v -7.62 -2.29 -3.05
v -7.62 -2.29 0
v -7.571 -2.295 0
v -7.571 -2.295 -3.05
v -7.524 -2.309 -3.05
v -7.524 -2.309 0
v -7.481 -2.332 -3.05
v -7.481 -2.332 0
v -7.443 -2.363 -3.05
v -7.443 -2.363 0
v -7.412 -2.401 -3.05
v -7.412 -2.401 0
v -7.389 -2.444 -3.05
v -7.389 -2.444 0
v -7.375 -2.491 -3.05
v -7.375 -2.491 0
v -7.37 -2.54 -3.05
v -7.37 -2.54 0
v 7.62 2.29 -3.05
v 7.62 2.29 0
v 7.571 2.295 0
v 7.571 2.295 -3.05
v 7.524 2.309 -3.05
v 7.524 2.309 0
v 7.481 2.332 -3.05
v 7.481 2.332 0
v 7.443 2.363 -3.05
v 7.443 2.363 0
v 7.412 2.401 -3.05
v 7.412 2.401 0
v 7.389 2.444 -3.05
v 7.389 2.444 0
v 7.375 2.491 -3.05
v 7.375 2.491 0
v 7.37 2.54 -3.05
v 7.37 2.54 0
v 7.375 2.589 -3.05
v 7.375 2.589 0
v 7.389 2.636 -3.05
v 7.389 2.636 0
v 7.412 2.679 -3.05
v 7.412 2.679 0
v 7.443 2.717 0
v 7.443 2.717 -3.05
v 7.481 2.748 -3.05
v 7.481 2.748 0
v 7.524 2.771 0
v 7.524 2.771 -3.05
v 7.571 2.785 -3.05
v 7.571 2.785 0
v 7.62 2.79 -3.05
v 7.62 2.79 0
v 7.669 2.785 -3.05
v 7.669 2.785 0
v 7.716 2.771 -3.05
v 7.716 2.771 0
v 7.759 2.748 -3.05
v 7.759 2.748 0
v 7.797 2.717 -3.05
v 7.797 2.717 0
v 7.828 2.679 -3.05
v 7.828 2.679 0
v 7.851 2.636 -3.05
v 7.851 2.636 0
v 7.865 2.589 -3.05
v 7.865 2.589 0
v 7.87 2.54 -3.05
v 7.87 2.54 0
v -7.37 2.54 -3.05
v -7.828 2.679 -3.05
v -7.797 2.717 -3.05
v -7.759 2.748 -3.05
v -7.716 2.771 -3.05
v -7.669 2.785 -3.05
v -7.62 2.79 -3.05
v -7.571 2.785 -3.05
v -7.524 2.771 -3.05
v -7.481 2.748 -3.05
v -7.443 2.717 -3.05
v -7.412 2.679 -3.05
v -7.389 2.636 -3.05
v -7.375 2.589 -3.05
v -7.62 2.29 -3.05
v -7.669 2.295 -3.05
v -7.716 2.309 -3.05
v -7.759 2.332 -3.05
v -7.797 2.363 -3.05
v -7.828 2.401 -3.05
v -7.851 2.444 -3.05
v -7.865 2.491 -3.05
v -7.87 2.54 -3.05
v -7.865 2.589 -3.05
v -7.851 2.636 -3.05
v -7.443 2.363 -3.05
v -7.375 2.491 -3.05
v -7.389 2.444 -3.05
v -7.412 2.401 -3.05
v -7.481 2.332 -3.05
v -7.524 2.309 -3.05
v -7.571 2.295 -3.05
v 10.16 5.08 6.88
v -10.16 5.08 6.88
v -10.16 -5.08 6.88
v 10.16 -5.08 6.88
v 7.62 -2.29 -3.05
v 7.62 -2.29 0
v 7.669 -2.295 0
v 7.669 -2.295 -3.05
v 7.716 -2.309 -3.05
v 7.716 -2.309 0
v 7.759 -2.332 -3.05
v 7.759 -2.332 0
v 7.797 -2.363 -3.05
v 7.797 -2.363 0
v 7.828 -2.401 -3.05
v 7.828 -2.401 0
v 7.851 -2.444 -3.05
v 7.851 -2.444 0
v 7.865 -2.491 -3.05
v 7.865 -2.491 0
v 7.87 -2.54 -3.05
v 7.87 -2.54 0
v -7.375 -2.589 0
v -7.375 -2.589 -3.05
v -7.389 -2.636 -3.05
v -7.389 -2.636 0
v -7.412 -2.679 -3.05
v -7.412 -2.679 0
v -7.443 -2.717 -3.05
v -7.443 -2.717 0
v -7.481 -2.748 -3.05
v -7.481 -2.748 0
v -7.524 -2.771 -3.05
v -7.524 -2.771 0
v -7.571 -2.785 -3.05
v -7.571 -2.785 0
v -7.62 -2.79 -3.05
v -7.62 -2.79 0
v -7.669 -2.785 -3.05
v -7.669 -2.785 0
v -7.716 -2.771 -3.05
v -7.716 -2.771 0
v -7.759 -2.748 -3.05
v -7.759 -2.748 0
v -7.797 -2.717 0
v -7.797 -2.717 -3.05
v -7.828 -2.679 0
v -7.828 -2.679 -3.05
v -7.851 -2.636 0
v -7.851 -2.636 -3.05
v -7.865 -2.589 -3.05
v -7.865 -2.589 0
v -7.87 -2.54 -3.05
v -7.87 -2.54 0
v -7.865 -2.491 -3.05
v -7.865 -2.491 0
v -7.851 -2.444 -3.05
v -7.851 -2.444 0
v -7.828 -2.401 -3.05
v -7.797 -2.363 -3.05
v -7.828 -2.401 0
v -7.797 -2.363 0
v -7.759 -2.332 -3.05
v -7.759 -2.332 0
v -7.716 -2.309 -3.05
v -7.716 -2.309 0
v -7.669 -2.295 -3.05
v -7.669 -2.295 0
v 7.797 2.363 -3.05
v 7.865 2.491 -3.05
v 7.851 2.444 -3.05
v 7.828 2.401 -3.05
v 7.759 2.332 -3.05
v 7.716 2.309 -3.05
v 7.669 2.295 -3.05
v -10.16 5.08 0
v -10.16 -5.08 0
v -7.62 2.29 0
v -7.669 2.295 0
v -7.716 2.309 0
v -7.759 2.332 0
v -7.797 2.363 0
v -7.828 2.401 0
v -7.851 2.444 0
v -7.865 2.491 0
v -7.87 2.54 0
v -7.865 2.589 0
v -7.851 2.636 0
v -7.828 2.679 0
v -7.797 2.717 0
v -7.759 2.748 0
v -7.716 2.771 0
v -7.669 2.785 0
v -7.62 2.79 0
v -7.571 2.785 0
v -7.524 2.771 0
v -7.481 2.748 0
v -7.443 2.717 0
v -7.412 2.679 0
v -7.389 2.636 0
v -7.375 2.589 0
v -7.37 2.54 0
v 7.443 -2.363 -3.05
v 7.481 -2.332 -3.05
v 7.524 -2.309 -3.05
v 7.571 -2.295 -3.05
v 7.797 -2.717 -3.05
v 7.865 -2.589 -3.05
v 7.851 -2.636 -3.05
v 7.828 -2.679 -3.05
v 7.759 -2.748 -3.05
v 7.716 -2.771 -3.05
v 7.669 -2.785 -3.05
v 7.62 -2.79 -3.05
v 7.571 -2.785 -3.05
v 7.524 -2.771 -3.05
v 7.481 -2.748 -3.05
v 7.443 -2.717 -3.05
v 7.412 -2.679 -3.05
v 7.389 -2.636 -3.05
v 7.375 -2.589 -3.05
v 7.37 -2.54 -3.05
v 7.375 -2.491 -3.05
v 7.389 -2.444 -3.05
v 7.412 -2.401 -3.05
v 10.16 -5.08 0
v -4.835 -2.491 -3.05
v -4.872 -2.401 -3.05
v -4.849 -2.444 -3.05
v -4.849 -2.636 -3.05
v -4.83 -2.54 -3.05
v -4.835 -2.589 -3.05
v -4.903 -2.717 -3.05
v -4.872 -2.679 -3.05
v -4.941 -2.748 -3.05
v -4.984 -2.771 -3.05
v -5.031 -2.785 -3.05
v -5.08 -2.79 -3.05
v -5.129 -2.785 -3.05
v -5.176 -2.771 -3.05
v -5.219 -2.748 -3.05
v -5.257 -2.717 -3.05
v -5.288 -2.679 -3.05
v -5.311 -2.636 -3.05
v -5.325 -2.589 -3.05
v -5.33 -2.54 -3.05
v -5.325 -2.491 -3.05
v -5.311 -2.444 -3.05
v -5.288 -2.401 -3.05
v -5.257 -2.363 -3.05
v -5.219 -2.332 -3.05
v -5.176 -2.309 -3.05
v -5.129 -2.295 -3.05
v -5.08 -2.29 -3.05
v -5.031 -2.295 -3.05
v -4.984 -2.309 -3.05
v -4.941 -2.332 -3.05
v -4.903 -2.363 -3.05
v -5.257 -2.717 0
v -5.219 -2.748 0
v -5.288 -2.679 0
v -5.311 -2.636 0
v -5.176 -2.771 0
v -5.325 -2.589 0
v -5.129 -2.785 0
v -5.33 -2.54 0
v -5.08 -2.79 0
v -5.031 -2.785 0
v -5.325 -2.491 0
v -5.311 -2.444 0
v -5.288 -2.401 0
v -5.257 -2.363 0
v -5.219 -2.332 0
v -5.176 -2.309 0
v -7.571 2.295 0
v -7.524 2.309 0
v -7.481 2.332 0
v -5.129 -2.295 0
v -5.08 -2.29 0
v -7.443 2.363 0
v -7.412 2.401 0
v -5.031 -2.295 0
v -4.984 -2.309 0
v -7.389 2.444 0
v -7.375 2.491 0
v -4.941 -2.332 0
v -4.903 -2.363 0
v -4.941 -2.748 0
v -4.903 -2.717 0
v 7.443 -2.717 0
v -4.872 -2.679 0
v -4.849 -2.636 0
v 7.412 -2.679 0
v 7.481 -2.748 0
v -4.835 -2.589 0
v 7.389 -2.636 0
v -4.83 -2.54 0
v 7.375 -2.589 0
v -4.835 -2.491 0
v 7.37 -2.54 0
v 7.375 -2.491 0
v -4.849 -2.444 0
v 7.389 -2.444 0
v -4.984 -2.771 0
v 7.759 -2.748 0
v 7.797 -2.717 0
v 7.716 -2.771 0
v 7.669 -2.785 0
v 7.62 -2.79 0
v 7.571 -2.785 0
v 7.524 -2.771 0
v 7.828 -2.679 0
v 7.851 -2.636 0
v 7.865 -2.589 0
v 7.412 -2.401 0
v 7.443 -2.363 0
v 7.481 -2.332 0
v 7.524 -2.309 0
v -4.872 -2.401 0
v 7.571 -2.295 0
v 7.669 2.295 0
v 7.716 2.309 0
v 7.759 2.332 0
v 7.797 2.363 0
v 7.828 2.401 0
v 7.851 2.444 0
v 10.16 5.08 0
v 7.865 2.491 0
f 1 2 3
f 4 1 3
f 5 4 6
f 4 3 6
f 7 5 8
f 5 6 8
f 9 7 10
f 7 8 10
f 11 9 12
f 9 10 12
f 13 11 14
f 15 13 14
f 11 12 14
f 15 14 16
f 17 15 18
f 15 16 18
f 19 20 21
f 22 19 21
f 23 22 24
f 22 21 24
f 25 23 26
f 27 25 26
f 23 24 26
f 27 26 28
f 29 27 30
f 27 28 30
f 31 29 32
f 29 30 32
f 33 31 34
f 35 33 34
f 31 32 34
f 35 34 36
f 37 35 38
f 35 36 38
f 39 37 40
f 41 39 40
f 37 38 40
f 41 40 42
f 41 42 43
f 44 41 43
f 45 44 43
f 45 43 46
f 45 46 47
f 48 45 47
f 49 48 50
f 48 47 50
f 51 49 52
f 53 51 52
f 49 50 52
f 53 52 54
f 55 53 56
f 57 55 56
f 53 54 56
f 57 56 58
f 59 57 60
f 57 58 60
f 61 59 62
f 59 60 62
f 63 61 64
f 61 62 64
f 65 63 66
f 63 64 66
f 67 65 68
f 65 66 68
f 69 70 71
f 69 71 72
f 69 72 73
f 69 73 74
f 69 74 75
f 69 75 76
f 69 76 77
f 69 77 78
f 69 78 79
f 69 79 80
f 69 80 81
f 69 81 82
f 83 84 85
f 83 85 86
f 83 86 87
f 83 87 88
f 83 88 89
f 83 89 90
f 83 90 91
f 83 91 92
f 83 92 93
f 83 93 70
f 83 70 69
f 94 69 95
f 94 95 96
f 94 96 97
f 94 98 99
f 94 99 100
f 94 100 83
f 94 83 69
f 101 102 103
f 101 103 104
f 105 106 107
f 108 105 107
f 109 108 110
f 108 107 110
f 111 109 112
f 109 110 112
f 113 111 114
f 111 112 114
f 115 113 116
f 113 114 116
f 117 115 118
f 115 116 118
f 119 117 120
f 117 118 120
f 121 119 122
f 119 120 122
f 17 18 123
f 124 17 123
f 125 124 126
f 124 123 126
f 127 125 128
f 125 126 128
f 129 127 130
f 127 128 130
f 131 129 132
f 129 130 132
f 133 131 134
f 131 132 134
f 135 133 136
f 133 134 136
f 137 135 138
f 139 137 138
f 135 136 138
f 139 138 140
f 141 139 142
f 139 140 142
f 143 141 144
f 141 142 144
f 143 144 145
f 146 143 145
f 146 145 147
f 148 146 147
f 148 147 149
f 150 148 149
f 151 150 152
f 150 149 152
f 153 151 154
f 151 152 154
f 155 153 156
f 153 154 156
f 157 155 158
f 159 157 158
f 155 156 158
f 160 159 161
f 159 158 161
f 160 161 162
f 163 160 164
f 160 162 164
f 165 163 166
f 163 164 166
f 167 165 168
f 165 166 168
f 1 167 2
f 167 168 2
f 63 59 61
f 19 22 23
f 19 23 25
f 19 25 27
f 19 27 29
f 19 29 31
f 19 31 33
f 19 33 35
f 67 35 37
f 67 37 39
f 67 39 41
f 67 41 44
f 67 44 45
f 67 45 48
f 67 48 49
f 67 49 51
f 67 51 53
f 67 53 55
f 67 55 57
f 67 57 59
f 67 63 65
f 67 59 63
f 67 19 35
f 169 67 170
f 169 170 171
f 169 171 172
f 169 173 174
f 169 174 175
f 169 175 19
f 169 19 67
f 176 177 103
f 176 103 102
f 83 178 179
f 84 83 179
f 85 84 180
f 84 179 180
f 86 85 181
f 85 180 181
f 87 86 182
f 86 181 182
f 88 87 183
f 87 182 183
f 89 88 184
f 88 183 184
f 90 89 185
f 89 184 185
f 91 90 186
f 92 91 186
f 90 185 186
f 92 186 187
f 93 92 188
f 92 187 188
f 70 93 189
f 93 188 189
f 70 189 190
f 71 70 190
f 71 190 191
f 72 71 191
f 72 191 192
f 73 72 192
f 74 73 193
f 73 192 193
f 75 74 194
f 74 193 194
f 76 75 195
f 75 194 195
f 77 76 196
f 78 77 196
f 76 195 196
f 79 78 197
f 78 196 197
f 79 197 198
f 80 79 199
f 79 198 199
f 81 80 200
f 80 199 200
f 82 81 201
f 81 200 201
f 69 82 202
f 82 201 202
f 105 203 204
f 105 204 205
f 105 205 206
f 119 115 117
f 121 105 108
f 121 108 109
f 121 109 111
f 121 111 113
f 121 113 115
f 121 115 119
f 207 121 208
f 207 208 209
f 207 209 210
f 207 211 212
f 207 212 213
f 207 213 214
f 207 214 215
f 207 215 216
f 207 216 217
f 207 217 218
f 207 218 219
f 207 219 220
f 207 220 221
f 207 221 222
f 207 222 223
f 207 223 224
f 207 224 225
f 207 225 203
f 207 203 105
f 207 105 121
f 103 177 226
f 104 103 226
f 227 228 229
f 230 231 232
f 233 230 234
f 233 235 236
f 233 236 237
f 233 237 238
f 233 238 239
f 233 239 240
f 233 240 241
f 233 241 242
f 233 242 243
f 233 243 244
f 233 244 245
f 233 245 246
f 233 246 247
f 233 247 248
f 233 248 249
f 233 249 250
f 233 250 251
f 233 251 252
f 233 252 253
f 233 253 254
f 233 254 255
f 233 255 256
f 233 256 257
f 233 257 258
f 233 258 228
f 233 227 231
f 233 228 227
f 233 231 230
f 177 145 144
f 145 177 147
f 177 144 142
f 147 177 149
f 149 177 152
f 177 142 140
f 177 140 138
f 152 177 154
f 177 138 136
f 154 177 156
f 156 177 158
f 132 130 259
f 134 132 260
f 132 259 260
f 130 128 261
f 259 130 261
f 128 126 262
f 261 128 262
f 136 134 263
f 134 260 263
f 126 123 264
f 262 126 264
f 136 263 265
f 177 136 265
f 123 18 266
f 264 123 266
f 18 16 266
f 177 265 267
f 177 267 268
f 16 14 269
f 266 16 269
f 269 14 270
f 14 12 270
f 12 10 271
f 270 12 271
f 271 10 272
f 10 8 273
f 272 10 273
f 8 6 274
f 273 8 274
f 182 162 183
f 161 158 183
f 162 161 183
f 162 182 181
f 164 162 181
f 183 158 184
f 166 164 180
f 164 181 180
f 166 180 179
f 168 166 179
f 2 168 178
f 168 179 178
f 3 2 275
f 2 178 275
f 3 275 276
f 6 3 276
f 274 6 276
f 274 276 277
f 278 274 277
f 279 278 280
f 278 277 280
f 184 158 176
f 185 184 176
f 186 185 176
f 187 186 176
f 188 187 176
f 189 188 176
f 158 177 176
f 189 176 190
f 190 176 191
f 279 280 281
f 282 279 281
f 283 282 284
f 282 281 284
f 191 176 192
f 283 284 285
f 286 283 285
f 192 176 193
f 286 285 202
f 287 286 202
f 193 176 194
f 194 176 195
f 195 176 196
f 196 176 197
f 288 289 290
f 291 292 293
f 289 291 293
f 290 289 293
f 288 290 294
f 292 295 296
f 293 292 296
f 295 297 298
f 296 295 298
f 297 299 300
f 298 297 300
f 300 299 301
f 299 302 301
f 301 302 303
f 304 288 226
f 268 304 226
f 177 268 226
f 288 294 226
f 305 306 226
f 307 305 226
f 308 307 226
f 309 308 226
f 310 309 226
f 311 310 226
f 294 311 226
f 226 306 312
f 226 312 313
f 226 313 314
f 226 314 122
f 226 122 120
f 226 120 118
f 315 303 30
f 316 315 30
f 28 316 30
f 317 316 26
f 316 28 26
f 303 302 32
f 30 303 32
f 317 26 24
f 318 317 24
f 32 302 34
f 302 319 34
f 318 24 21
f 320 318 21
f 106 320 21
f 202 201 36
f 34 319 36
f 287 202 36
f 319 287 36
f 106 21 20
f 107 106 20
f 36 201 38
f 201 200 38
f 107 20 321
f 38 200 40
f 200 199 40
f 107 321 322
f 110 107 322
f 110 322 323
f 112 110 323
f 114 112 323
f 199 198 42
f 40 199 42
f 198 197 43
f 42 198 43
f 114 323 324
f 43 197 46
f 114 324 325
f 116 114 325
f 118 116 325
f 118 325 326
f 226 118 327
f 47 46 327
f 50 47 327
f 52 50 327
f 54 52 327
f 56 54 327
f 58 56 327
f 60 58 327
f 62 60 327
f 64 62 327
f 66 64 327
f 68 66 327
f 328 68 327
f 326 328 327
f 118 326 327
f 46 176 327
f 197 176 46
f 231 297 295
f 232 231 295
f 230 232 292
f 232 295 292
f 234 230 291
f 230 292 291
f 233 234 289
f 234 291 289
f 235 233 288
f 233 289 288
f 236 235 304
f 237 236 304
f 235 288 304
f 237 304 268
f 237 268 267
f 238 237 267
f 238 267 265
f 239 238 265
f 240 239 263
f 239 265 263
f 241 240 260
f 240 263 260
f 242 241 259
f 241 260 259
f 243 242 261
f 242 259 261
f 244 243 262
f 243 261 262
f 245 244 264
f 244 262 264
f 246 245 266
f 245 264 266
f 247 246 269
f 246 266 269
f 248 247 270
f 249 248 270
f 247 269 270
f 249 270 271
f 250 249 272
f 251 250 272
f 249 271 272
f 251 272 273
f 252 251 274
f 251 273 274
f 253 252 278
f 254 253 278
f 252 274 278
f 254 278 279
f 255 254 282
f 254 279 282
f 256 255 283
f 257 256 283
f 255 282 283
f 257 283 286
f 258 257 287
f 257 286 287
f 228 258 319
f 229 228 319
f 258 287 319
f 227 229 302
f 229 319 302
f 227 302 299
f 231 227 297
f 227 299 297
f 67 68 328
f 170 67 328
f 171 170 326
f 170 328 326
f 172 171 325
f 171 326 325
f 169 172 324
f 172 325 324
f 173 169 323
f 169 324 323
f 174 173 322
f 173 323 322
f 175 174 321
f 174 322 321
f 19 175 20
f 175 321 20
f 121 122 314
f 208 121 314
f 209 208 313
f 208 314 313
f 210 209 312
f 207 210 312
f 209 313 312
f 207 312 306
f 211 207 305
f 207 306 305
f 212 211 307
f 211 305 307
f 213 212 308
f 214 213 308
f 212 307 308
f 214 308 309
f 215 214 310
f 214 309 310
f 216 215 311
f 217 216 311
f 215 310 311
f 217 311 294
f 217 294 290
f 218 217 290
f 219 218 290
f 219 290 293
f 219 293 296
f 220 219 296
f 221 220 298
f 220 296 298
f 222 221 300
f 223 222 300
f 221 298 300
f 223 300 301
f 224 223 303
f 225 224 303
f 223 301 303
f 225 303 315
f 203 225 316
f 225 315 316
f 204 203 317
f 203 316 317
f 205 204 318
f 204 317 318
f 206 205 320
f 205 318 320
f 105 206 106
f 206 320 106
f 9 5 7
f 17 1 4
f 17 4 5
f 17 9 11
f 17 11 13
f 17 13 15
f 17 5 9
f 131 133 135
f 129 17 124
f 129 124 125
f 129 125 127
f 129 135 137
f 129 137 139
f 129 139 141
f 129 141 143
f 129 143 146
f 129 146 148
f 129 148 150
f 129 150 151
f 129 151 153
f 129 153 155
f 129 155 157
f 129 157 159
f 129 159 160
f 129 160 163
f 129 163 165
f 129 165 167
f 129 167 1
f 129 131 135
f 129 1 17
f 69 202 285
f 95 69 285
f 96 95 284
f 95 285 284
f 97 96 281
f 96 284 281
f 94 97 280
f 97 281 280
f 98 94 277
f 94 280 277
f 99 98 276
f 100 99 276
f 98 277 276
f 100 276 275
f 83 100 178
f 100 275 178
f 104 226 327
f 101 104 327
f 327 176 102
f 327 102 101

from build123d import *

# Parameters (mm, degrees)
F0_W     = 20.32
F0_H     = 10.16
F1_DEPTH = 6.88
F2_R     = 0.25
F3_DEPTH = 3.05


with BuildPart() as f1:
    # F0 (on Top) → F1 (new body)
    with BuildSketch(Plane.XY):
        Rectangle(F0_W, F0_H)
    extrude(amount=F1_DEPTH)

    # F2 (on face) → F3 (join)
    with BuildSketch(Plane(origin=(0, 0, 0), x_dir=(1, 0, 0), z_dir=(0, 0, -1))):
        with BuildLine():
            ThreePointArc((-7.62, 2.29), (-7.443223, 2.363223), (-7.37, 2.54))
            ThreePointArc((-7.37, 2.54), (-7.796777, 2.716777), (-7.62, 2.29))
        make_face()
        with BuildLine():
            ThreePointArc((-7.37, -2.54), (-7.443223, -2.363223), (-7.62, -2.29))
            ThreePointArc((-7.62, -2.29), (-7.796777, -2.716777), (-7.37, -2.54))
        make_face()
        with Locations((-5.08, 2.54)):
            Circle(F2_R)
        with BuildLine():
            ThreePointArc((7.62, 2.29), (7.796777, 2.363223), (7.87, 2.54))
            ThreePointArc((7.87, 2.54), (7.443223, 2.716777), (7.62, 2.29))
        make_face()
        with BuildLine():
            ThreePointArc((7.87, -2.54), (7.796777, -2.363223), (7.62, -2.29))
            ThreePointArc((7.62, -2.29), (7.443223, -2.716777), (7.87, -2.54))
        make_face()
    extrude(amount=F3_DEPTH)


solid = f1.part
